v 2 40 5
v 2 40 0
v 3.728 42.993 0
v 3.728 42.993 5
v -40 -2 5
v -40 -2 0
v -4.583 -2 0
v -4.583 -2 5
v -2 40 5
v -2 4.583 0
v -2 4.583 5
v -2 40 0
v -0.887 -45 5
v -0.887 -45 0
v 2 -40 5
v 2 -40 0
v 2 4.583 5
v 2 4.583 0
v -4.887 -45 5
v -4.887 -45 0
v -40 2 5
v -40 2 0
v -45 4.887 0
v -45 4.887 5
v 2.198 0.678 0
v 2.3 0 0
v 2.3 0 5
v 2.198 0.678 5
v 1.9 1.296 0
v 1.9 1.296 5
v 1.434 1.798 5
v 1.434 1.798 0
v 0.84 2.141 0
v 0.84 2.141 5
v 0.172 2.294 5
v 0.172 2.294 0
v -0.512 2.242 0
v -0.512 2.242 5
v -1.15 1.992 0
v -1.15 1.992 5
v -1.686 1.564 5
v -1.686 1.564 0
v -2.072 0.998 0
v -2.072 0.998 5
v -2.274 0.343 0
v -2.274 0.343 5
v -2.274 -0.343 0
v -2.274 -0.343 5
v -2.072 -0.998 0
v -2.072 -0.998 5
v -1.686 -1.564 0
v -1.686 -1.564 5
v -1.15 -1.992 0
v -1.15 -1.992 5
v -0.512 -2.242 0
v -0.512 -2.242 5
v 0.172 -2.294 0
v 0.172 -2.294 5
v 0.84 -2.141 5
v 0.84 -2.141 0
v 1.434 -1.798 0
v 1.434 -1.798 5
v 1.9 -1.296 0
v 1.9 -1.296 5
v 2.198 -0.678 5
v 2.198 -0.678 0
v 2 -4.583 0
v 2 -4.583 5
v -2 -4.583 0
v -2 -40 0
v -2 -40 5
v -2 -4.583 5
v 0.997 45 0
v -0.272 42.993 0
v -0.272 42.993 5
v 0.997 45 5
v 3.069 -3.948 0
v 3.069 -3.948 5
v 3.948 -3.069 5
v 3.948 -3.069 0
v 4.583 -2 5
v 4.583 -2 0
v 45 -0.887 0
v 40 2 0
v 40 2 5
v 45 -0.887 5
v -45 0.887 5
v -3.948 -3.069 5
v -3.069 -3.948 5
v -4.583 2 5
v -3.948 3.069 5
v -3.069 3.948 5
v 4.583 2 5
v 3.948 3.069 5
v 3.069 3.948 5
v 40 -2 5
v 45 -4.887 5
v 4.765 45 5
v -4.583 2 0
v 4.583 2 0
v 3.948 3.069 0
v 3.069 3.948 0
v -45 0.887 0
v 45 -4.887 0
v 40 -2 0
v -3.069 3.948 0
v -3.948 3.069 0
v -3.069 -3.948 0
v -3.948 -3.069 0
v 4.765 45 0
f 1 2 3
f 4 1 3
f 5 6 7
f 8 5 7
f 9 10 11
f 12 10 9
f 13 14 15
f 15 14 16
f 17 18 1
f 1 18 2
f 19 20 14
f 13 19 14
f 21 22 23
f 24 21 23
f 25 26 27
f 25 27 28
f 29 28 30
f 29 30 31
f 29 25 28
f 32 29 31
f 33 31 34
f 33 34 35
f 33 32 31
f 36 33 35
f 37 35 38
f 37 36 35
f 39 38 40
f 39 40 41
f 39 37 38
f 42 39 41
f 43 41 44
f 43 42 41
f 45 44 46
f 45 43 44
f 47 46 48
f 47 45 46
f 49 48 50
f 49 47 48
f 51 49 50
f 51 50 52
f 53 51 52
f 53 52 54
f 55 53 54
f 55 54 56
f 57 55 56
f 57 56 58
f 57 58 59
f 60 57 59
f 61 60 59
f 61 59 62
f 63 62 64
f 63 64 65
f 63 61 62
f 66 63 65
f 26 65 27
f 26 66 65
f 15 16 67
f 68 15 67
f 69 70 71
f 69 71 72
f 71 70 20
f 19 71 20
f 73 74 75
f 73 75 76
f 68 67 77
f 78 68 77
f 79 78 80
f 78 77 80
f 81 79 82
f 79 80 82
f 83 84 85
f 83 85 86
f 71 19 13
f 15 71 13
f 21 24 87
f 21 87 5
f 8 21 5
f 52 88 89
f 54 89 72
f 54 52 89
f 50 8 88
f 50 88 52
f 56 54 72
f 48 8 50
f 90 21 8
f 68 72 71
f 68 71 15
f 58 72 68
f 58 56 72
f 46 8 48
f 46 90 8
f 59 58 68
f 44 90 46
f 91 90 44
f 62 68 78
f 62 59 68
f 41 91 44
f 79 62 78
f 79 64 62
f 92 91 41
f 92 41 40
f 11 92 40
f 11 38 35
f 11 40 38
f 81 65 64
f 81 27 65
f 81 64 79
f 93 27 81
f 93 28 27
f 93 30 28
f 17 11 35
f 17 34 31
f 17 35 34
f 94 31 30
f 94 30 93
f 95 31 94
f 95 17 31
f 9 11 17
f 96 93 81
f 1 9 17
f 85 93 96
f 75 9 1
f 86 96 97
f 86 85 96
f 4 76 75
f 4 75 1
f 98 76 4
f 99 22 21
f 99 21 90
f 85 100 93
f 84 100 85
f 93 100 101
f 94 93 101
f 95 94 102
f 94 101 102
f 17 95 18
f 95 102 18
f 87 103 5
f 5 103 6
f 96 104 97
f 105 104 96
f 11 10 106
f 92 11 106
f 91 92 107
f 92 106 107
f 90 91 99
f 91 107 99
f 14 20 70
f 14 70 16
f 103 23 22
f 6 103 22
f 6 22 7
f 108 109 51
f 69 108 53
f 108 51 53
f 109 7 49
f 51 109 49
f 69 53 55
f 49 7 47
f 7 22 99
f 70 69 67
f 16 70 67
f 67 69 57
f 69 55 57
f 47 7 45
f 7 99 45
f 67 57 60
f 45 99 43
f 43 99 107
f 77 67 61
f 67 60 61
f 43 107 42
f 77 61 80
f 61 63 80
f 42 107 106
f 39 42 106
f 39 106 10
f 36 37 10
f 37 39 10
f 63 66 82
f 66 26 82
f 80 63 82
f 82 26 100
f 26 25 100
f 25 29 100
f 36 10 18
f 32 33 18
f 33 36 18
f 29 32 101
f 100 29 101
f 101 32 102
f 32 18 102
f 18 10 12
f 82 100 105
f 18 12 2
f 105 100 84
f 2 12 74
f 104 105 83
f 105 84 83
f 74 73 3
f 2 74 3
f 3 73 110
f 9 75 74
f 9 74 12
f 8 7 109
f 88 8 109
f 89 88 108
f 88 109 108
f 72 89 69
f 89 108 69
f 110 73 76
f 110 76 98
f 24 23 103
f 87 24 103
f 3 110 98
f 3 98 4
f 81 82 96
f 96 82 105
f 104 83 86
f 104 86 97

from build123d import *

# Parameters (mm, degrees)
SKETCH_1_R      = 5
SKETCH_1_R_2    = 2.3
EXTRUDE_1_DEPTH = 5
SKETCH_2_W      = 2
SKETCH_2_H      = 35.417424305
SKETCH_2_W_2    = 35.417424305
SKETCH_2_H_2    = 2
EXTRUDE_2_DEPTH = 5


with BuildPart() as part:
    # ｽｹｯﾁ1 → ﾎﾞｽ - 押し出し1 (new body)
    with BuildSketch(Plane.XY):
        Circle(SKETCH_1_R)
        Circle(SKETCH_1_R_2, mode=Mode.SUBTRACT)
    extrude(amount=EXTRUDE_1_DEPTH)

    # ｽｹｯﾁ2 → ﾎﾞｽ - 押し出し2 (add)
    with BuildSketch(Plane.XY):
        with Locations((1, 22.291287848)):
            Rectangle(SKETCH_2_W, SKETCH_2_H)
        with Locations((-1, 22.291287848)):
            Rectangle(SKETCH_2_W, SKETCH_2_H)
        Polygon((-2, 40), (0, 40), (2, 40), (3.728267906, 42.993447822), (-0.271732094, 42.993447822), align=None)
        Polygon((4.765204655, 45), (3.728267906, 42.993447822), (-0.271732094, 42.993447822), (0.996826512, 45), align=None)
        with Locations((-22.291287848, 1)):
            Rectangle(SKETCH_2_W_2, SKETCH_2_H_2)
        with Locations((-22.291287848, -1)):
            Rectangle(SKETCH_2_W_2, SKETCH_2_H_2)
        Polygon((-40, -2), (-40, 0), (-40, 2), (-45, 4.886751346), (-45, 0.886751346), align=None)
        with Locations((22.291287848, -1)):
            Rectangle(SKETCH_2_W_2, SKETCH_2_H_2)
        with Locations((22.291287848, 1)):
            Rectangle(SKETCH_2_W_2, SKETCH_2_H_2)
        Polygon((45, -4.886751346), (40, -2), (40, 2), (45, -0.886751346), align=None)
        with Locations((1, -22.291287848)):
            Rectangle(SKETCH_2_W, SKETCH_2_H)
        with Locations((-1, -22.291287848)):
            Rectangle(SKETCH_2_W, SKETCH_2_H)
        Polygon((-4.886751346, -45), (-0.886751346, -45), (2, -40), (0, -40), (-2, -40), align=None)
    extrude(amount=EXTRUDE_2_DEPTH)


solid = part.part
